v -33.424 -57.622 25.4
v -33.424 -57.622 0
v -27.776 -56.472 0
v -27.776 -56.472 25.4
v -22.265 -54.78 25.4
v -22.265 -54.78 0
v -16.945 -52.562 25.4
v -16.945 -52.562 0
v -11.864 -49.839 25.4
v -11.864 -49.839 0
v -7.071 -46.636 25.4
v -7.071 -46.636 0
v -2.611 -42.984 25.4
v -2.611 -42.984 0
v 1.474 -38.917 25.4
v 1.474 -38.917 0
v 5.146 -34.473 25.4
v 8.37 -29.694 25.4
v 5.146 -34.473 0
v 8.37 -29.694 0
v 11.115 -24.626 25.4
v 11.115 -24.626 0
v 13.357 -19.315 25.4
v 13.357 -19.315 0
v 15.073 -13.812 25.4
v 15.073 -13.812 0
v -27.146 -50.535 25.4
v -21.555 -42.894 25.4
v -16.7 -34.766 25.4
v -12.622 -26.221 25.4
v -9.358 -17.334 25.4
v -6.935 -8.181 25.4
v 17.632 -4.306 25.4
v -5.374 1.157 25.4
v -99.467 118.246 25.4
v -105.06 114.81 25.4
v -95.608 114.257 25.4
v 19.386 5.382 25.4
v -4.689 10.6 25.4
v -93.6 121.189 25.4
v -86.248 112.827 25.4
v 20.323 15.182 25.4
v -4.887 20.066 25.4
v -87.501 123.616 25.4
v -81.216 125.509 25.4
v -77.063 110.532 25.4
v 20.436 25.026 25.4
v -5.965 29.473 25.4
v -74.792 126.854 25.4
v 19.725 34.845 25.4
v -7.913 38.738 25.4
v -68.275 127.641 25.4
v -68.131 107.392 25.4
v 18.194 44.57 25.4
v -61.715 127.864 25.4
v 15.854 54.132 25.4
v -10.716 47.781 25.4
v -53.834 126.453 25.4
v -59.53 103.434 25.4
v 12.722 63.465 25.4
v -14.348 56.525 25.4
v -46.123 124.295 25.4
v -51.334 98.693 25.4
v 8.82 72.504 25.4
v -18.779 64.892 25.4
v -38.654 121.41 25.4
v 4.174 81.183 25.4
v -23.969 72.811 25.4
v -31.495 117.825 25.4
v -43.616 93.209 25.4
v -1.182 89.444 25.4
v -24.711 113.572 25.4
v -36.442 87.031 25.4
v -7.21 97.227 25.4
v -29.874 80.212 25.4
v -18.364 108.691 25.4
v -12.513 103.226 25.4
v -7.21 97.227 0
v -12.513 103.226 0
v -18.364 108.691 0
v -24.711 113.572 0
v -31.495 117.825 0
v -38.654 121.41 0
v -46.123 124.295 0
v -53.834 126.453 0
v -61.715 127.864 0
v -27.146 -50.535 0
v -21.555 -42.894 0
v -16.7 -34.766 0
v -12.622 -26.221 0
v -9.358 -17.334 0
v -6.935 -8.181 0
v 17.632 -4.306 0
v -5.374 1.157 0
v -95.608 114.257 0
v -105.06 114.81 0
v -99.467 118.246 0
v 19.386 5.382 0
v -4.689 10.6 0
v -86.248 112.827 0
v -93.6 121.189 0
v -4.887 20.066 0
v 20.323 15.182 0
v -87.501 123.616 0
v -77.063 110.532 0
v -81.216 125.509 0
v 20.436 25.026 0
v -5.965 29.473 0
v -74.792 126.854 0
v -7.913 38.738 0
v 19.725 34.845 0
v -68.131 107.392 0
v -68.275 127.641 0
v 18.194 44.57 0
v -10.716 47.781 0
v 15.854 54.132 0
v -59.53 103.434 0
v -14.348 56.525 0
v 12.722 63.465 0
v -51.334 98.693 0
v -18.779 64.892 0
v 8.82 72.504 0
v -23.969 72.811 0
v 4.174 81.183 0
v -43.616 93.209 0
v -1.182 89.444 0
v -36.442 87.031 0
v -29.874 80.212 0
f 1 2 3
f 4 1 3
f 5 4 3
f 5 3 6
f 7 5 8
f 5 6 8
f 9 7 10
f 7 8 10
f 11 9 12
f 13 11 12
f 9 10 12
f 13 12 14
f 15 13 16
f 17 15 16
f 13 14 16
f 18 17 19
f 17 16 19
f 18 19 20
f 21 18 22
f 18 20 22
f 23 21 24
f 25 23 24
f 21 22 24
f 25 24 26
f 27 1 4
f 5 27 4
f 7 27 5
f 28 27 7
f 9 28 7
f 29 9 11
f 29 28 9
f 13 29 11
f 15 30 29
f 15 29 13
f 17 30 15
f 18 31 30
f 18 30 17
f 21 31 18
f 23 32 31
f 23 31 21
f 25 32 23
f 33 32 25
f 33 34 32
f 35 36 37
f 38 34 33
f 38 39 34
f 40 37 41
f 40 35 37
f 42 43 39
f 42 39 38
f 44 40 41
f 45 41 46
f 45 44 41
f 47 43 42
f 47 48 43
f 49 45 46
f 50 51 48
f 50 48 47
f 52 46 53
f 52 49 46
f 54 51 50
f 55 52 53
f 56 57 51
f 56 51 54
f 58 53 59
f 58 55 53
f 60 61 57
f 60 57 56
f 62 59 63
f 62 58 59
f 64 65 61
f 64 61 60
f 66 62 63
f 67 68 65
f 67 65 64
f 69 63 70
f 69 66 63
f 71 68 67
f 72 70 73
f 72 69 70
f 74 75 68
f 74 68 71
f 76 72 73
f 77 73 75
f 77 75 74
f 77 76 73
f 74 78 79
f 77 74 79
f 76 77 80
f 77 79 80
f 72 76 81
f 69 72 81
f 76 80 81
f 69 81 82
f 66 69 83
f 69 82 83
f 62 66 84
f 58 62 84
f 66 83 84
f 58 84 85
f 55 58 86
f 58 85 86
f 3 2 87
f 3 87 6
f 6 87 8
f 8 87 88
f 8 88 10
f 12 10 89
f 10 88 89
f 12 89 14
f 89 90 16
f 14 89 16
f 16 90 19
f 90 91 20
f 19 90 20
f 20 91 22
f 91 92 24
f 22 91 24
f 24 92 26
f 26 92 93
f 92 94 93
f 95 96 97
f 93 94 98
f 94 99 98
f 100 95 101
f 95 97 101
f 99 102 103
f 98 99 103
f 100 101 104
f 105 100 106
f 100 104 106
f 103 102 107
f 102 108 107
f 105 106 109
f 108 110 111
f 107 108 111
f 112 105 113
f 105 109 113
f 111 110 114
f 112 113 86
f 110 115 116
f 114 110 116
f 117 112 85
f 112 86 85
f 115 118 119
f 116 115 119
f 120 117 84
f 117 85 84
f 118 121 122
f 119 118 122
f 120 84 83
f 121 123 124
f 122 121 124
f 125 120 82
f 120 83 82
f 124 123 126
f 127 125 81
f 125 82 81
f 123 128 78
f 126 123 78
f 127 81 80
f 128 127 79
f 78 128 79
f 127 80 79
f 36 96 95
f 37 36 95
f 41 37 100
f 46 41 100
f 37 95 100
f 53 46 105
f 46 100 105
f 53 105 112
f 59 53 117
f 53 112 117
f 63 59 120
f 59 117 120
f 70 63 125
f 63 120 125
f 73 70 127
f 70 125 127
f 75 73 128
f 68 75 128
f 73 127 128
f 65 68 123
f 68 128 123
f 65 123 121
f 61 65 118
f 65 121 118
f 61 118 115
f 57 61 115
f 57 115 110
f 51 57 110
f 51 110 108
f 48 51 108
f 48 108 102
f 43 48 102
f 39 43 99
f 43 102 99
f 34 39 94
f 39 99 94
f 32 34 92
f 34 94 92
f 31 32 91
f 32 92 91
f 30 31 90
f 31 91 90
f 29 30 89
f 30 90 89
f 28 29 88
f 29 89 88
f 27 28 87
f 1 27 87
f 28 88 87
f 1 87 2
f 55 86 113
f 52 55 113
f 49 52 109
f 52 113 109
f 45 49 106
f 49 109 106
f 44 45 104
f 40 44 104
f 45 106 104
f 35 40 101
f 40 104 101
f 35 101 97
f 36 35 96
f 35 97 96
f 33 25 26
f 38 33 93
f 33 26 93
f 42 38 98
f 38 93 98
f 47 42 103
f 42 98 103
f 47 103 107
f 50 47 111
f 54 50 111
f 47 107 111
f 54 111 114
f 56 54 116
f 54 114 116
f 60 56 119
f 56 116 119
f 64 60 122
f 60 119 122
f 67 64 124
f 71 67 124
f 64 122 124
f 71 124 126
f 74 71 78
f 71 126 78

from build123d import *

# Parameters (mm, degrees)
F1_DEPTH = 25.4


with BuildPart() as f1:
    # F0 (on Top) → F1 (new body)
    with BuildSketch(Plane.XY):
        with BuildLine():
            ThreePointArc((-105.059527, 114.809577), (-12.430289, 52.195551), (-33.424245, -57.622234))
            ThreePointArc((-33.424245, -57.622234), (-2.611057, -42.983897), (15.07293, -13.811819))
            ThreePointArc((15.07293, -13.811819), (18.193999, 44.569559), (-7.210166, 97.226513))
            ThreePointArc((-7.210166, 97.226513), (-31.495036, 117.82512), (-61.715451, 127.864246))
            ThreePointArc((-61.715451, 127.864246), (-84.379276, 124.629841), (-105.059527, 114.809577))
        make_face()
    extrude(amount=F1_DEPTH)


solid = f1.part
